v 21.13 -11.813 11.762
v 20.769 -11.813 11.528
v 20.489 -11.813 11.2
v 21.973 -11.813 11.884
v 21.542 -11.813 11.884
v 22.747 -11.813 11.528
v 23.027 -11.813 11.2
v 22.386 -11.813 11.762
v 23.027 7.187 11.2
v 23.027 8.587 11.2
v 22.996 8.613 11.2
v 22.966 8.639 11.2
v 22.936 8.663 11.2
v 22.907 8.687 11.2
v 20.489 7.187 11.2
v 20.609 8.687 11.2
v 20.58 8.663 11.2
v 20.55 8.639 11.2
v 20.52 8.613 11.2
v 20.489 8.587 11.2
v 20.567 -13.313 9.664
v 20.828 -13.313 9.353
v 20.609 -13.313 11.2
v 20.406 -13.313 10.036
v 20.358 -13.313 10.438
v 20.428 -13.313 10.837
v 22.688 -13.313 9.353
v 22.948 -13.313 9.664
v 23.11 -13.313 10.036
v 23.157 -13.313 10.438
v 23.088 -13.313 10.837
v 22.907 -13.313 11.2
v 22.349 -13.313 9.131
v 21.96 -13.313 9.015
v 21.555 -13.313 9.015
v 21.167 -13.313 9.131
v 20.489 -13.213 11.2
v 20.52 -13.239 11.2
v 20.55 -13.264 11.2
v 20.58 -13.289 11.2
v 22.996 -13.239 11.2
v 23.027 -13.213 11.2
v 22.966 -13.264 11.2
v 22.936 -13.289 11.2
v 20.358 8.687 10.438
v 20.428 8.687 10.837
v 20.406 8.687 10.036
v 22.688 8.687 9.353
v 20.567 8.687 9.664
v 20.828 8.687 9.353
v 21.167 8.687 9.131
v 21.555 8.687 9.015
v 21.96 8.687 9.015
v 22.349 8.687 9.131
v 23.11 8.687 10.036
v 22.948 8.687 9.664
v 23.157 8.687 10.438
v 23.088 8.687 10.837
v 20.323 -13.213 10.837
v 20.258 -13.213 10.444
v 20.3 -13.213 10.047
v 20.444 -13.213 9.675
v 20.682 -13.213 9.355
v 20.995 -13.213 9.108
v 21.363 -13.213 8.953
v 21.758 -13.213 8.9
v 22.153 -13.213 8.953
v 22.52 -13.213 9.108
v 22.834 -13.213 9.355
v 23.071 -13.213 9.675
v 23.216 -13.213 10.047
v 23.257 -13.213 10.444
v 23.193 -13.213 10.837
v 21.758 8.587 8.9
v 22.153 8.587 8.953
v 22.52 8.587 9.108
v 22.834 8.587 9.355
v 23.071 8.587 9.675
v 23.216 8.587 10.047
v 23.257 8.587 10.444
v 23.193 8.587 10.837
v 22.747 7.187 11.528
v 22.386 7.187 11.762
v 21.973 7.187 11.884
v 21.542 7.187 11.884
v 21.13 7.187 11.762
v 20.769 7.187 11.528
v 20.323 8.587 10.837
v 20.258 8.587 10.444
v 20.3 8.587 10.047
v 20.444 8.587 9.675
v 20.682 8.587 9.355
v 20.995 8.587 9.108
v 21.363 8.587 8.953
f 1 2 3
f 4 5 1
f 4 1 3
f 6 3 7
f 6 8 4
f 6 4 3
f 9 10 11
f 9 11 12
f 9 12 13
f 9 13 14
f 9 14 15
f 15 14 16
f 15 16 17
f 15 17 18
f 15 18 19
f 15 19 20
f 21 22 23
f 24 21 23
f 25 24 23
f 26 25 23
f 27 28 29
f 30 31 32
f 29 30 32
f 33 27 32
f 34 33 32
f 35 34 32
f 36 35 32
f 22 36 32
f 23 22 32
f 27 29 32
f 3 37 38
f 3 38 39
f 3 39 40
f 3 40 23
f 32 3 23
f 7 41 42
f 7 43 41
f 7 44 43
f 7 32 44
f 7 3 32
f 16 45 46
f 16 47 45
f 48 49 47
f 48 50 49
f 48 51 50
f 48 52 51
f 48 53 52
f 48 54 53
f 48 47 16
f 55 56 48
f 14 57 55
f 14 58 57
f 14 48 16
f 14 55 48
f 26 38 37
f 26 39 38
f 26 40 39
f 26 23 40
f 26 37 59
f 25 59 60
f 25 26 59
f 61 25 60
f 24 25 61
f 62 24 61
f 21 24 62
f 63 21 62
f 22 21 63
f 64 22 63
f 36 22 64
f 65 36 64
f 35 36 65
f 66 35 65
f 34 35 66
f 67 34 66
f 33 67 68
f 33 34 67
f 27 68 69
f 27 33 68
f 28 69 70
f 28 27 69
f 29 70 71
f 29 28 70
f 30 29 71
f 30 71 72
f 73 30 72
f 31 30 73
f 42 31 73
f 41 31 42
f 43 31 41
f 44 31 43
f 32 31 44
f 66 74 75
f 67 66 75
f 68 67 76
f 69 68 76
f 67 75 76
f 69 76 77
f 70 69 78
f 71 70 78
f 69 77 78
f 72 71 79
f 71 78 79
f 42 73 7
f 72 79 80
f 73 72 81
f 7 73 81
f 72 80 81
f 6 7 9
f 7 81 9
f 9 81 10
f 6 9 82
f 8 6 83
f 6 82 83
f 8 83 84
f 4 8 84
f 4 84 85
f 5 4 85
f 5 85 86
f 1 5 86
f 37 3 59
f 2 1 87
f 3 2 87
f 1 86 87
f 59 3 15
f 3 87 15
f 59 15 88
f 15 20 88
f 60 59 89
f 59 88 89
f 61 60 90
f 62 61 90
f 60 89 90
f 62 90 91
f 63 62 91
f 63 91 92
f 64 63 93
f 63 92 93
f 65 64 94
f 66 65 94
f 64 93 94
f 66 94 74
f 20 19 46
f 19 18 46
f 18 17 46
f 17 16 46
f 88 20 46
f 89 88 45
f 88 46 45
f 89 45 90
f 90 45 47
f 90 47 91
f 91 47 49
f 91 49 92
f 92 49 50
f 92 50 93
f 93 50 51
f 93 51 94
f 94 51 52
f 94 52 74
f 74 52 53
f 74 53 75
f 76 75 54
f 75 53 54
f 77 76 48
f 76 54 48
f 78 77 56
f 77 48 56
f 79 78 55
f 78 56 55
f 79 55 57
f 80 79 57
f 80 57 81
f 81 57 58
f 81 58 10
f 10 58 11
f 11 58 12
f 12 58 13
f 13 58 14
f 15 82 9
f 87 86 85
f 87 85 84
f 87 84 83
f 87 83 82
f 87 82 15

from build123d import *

# Parameters (mm, degrees)
ESQUISSE1_W             = 1.5
ESQUISSE1_H             = 22
ENL_V_MAT_EXTRU_1_DEPTH = 1.5
ENL_V_START             = -1.5
ENL_V_MAT_EXTRU_2_DEPTH = 1.5
CHANFREIN1_SIZE         = 0.1
CHANFREIN2_SIZE         = 0.1


with BuildPart() as part:
    # Esquisse1 → Révolution1 (revolve)
    with BuildSketch(Plane.XY.offset(10.4), mode=Mode.PRIVATE) as r_volution1_sk:
        with Locations((22.507807929, -2.312735583)):
            Rectangle(ESQUISSE1_W, ESQUISSE1_H)
    revolve(r_volution1_sk.sketch.rotate(Axis((21.757807929, 8.687264417, 10.4), (0, -1, 0)), 270), axis=Axis((21.757807929, 8.687264417, 10.4), (0, -1, 0)))

    # Esquisse2 → Enlèv. mat.-Extru.1 (cut)
    with BuildSketch(Plane(origin=(0, 8.687264417, 0), x_dir=(-1, 0, 0), z_dir=(0, 1, 0))):
        with BuildLine():
            Line((-23.026665683, 11.2), (-20.488950175, 11.2))
            ThreePointArc((-20.488950175, 11.2), (-21.757807929, 11.9), (-23.026665683, 11.2))
        make_face()
    extrude(amount=-ENL_V_MAT_EXTRU_1_DEPTH, mode=Mode.SUBTRACT)

    # Esquisse3 → Enlèv. mat.-Extru.2 (cut)
    with BuildSketch(Plane.XZ.offset(13.312735583).offset(ENL_V_START)):
        with BuildLine():
            Line((20.488950175, 11.2), (23.026665683, 11.2))
            ThreePointArc((23.026665683, 11.2), (21.757807929, 11.9), (20.488950175, 11.2))
        make_face()
    extrude(amount=ENL_V_MAT_EXTRU_2_DEPTH, mode=Mode.SUBTRACT)

    # Chanfrein1
    chanfrein1_edges = [part.edges().sort_by_distance(p)[0] for p in [
        (20.444415375, 8.687264417, 9.675431163),
    ]]
    chamfer(chanfrein1_edges, length=CHANFREIN1_SIZE)

    # Chanfrein2
    chanfrein2_edges = [part.edges().sort_by_distance(p)[0] for p in [
        (23.071200482, -13.312735583, 9.675431163),
    ]]
    chamfer(chanfrein2_edges, length=CHANFREIN2_SIZE)


solid = part.part
